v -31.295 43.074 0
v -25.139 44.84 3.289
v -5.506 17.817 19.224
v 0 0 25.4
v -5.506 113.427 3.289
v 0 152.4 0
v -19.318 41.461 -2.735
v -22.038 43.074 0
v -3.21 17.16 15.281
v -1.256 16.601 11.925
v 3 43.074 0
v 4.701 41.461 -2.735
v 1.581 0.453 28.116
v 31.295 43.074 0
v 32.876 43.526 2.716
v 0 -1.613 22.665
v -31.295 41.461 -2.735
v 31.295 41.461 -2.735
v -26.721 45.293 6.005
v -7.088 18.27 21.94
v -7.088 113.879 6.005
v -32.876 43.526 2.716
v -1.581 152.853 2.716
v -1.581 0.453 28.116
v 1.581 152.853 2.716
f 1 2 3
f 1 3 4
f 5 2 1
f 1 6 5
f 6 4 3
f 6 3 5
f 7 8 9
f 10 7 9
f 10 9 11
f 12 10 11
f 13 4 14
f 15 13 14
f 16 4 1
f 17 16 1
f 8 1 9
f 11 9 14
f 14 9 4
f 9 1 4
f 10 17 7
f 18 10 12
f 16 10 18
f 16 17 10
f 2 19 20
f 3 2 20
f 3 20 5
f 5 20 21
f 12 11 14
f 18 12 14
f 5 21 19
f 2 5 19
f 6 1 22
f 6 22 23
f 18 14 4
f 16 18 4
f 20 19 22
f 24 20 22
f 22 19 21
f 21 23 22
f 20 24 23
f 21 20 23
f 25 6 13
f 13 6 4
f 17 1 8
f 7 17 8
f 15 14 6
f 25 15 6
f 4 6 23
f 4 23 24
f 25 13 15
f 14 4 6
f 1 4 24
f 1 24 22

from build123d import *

# Parameters (mm, degrees)
F6_DEPTH  = 3.175
F10_DEPTH = 3.175
F12_DEPTH = 43.844599


with BuildPart() as f6:
    # F5 (on face) → F6 (new body)
    with BuildSketch(Plane(origin=(10.820237, 3.097301, 18.583808), x_dir=(0.867162, -0.081875, -0.49125), z_dir=(0.498027, 0.142561, 0.855363))):
        Polygon((23.610983, 42.487504), (-12.477761, 150.326434), (-12.477761, -4.175734), align=None)
    extrude(amount=F6_DEPTH)


with BuildPart() as f7_1:
    # F7: instance of F6
    add(f6.part.mirror(Plane.YZ))


with BuildPart() as f10:
    # F9 (on face) → F10 (new body)
    with BuildSketch(Plane(origin=(0, 11.113549, 18.846464), x_dir=(1, 0, 0), z_dir=(0, -0.50795, -0.861387))):
        Polygon((0, -37.102991), (31.294778, -37.102991), (0, 12.90193), (-31.294778, -37.102991), align=None)
    extrude(amount=F10_DEPTH)


with BuildPart() as f12_tool:
    # F11 (on face) → F12 (new body, through all)
    with BuildSketch(Plane(origin=(-12.401471, 3.549931, 21.299586), x_dir=(0.867162, 0.081875, 0.49125), z_dir=(-0.498027, 0.142561, 0.855363))):
        Polygon((6.127762, 14.414545), (6.127762, 111.342477), (-16.512744, 43.689029), align=None)
    extrude(amount=-F12_DEPTH)


with BuildPart() as f7_1_1:
    add(f7_1.part)

    # F12: cut by f12_tool
    add(f12_tool.part, mode=Mode.SUBTRACT)


with BuildPart() as f10_1:
    add(f10.part)

    # F12: cut by f12_tool
    add(f12_tool.part, mode=Mode.SUBTRACT)


solid = Compound([f6.part, f7_1_1.part, f10_1.part])
